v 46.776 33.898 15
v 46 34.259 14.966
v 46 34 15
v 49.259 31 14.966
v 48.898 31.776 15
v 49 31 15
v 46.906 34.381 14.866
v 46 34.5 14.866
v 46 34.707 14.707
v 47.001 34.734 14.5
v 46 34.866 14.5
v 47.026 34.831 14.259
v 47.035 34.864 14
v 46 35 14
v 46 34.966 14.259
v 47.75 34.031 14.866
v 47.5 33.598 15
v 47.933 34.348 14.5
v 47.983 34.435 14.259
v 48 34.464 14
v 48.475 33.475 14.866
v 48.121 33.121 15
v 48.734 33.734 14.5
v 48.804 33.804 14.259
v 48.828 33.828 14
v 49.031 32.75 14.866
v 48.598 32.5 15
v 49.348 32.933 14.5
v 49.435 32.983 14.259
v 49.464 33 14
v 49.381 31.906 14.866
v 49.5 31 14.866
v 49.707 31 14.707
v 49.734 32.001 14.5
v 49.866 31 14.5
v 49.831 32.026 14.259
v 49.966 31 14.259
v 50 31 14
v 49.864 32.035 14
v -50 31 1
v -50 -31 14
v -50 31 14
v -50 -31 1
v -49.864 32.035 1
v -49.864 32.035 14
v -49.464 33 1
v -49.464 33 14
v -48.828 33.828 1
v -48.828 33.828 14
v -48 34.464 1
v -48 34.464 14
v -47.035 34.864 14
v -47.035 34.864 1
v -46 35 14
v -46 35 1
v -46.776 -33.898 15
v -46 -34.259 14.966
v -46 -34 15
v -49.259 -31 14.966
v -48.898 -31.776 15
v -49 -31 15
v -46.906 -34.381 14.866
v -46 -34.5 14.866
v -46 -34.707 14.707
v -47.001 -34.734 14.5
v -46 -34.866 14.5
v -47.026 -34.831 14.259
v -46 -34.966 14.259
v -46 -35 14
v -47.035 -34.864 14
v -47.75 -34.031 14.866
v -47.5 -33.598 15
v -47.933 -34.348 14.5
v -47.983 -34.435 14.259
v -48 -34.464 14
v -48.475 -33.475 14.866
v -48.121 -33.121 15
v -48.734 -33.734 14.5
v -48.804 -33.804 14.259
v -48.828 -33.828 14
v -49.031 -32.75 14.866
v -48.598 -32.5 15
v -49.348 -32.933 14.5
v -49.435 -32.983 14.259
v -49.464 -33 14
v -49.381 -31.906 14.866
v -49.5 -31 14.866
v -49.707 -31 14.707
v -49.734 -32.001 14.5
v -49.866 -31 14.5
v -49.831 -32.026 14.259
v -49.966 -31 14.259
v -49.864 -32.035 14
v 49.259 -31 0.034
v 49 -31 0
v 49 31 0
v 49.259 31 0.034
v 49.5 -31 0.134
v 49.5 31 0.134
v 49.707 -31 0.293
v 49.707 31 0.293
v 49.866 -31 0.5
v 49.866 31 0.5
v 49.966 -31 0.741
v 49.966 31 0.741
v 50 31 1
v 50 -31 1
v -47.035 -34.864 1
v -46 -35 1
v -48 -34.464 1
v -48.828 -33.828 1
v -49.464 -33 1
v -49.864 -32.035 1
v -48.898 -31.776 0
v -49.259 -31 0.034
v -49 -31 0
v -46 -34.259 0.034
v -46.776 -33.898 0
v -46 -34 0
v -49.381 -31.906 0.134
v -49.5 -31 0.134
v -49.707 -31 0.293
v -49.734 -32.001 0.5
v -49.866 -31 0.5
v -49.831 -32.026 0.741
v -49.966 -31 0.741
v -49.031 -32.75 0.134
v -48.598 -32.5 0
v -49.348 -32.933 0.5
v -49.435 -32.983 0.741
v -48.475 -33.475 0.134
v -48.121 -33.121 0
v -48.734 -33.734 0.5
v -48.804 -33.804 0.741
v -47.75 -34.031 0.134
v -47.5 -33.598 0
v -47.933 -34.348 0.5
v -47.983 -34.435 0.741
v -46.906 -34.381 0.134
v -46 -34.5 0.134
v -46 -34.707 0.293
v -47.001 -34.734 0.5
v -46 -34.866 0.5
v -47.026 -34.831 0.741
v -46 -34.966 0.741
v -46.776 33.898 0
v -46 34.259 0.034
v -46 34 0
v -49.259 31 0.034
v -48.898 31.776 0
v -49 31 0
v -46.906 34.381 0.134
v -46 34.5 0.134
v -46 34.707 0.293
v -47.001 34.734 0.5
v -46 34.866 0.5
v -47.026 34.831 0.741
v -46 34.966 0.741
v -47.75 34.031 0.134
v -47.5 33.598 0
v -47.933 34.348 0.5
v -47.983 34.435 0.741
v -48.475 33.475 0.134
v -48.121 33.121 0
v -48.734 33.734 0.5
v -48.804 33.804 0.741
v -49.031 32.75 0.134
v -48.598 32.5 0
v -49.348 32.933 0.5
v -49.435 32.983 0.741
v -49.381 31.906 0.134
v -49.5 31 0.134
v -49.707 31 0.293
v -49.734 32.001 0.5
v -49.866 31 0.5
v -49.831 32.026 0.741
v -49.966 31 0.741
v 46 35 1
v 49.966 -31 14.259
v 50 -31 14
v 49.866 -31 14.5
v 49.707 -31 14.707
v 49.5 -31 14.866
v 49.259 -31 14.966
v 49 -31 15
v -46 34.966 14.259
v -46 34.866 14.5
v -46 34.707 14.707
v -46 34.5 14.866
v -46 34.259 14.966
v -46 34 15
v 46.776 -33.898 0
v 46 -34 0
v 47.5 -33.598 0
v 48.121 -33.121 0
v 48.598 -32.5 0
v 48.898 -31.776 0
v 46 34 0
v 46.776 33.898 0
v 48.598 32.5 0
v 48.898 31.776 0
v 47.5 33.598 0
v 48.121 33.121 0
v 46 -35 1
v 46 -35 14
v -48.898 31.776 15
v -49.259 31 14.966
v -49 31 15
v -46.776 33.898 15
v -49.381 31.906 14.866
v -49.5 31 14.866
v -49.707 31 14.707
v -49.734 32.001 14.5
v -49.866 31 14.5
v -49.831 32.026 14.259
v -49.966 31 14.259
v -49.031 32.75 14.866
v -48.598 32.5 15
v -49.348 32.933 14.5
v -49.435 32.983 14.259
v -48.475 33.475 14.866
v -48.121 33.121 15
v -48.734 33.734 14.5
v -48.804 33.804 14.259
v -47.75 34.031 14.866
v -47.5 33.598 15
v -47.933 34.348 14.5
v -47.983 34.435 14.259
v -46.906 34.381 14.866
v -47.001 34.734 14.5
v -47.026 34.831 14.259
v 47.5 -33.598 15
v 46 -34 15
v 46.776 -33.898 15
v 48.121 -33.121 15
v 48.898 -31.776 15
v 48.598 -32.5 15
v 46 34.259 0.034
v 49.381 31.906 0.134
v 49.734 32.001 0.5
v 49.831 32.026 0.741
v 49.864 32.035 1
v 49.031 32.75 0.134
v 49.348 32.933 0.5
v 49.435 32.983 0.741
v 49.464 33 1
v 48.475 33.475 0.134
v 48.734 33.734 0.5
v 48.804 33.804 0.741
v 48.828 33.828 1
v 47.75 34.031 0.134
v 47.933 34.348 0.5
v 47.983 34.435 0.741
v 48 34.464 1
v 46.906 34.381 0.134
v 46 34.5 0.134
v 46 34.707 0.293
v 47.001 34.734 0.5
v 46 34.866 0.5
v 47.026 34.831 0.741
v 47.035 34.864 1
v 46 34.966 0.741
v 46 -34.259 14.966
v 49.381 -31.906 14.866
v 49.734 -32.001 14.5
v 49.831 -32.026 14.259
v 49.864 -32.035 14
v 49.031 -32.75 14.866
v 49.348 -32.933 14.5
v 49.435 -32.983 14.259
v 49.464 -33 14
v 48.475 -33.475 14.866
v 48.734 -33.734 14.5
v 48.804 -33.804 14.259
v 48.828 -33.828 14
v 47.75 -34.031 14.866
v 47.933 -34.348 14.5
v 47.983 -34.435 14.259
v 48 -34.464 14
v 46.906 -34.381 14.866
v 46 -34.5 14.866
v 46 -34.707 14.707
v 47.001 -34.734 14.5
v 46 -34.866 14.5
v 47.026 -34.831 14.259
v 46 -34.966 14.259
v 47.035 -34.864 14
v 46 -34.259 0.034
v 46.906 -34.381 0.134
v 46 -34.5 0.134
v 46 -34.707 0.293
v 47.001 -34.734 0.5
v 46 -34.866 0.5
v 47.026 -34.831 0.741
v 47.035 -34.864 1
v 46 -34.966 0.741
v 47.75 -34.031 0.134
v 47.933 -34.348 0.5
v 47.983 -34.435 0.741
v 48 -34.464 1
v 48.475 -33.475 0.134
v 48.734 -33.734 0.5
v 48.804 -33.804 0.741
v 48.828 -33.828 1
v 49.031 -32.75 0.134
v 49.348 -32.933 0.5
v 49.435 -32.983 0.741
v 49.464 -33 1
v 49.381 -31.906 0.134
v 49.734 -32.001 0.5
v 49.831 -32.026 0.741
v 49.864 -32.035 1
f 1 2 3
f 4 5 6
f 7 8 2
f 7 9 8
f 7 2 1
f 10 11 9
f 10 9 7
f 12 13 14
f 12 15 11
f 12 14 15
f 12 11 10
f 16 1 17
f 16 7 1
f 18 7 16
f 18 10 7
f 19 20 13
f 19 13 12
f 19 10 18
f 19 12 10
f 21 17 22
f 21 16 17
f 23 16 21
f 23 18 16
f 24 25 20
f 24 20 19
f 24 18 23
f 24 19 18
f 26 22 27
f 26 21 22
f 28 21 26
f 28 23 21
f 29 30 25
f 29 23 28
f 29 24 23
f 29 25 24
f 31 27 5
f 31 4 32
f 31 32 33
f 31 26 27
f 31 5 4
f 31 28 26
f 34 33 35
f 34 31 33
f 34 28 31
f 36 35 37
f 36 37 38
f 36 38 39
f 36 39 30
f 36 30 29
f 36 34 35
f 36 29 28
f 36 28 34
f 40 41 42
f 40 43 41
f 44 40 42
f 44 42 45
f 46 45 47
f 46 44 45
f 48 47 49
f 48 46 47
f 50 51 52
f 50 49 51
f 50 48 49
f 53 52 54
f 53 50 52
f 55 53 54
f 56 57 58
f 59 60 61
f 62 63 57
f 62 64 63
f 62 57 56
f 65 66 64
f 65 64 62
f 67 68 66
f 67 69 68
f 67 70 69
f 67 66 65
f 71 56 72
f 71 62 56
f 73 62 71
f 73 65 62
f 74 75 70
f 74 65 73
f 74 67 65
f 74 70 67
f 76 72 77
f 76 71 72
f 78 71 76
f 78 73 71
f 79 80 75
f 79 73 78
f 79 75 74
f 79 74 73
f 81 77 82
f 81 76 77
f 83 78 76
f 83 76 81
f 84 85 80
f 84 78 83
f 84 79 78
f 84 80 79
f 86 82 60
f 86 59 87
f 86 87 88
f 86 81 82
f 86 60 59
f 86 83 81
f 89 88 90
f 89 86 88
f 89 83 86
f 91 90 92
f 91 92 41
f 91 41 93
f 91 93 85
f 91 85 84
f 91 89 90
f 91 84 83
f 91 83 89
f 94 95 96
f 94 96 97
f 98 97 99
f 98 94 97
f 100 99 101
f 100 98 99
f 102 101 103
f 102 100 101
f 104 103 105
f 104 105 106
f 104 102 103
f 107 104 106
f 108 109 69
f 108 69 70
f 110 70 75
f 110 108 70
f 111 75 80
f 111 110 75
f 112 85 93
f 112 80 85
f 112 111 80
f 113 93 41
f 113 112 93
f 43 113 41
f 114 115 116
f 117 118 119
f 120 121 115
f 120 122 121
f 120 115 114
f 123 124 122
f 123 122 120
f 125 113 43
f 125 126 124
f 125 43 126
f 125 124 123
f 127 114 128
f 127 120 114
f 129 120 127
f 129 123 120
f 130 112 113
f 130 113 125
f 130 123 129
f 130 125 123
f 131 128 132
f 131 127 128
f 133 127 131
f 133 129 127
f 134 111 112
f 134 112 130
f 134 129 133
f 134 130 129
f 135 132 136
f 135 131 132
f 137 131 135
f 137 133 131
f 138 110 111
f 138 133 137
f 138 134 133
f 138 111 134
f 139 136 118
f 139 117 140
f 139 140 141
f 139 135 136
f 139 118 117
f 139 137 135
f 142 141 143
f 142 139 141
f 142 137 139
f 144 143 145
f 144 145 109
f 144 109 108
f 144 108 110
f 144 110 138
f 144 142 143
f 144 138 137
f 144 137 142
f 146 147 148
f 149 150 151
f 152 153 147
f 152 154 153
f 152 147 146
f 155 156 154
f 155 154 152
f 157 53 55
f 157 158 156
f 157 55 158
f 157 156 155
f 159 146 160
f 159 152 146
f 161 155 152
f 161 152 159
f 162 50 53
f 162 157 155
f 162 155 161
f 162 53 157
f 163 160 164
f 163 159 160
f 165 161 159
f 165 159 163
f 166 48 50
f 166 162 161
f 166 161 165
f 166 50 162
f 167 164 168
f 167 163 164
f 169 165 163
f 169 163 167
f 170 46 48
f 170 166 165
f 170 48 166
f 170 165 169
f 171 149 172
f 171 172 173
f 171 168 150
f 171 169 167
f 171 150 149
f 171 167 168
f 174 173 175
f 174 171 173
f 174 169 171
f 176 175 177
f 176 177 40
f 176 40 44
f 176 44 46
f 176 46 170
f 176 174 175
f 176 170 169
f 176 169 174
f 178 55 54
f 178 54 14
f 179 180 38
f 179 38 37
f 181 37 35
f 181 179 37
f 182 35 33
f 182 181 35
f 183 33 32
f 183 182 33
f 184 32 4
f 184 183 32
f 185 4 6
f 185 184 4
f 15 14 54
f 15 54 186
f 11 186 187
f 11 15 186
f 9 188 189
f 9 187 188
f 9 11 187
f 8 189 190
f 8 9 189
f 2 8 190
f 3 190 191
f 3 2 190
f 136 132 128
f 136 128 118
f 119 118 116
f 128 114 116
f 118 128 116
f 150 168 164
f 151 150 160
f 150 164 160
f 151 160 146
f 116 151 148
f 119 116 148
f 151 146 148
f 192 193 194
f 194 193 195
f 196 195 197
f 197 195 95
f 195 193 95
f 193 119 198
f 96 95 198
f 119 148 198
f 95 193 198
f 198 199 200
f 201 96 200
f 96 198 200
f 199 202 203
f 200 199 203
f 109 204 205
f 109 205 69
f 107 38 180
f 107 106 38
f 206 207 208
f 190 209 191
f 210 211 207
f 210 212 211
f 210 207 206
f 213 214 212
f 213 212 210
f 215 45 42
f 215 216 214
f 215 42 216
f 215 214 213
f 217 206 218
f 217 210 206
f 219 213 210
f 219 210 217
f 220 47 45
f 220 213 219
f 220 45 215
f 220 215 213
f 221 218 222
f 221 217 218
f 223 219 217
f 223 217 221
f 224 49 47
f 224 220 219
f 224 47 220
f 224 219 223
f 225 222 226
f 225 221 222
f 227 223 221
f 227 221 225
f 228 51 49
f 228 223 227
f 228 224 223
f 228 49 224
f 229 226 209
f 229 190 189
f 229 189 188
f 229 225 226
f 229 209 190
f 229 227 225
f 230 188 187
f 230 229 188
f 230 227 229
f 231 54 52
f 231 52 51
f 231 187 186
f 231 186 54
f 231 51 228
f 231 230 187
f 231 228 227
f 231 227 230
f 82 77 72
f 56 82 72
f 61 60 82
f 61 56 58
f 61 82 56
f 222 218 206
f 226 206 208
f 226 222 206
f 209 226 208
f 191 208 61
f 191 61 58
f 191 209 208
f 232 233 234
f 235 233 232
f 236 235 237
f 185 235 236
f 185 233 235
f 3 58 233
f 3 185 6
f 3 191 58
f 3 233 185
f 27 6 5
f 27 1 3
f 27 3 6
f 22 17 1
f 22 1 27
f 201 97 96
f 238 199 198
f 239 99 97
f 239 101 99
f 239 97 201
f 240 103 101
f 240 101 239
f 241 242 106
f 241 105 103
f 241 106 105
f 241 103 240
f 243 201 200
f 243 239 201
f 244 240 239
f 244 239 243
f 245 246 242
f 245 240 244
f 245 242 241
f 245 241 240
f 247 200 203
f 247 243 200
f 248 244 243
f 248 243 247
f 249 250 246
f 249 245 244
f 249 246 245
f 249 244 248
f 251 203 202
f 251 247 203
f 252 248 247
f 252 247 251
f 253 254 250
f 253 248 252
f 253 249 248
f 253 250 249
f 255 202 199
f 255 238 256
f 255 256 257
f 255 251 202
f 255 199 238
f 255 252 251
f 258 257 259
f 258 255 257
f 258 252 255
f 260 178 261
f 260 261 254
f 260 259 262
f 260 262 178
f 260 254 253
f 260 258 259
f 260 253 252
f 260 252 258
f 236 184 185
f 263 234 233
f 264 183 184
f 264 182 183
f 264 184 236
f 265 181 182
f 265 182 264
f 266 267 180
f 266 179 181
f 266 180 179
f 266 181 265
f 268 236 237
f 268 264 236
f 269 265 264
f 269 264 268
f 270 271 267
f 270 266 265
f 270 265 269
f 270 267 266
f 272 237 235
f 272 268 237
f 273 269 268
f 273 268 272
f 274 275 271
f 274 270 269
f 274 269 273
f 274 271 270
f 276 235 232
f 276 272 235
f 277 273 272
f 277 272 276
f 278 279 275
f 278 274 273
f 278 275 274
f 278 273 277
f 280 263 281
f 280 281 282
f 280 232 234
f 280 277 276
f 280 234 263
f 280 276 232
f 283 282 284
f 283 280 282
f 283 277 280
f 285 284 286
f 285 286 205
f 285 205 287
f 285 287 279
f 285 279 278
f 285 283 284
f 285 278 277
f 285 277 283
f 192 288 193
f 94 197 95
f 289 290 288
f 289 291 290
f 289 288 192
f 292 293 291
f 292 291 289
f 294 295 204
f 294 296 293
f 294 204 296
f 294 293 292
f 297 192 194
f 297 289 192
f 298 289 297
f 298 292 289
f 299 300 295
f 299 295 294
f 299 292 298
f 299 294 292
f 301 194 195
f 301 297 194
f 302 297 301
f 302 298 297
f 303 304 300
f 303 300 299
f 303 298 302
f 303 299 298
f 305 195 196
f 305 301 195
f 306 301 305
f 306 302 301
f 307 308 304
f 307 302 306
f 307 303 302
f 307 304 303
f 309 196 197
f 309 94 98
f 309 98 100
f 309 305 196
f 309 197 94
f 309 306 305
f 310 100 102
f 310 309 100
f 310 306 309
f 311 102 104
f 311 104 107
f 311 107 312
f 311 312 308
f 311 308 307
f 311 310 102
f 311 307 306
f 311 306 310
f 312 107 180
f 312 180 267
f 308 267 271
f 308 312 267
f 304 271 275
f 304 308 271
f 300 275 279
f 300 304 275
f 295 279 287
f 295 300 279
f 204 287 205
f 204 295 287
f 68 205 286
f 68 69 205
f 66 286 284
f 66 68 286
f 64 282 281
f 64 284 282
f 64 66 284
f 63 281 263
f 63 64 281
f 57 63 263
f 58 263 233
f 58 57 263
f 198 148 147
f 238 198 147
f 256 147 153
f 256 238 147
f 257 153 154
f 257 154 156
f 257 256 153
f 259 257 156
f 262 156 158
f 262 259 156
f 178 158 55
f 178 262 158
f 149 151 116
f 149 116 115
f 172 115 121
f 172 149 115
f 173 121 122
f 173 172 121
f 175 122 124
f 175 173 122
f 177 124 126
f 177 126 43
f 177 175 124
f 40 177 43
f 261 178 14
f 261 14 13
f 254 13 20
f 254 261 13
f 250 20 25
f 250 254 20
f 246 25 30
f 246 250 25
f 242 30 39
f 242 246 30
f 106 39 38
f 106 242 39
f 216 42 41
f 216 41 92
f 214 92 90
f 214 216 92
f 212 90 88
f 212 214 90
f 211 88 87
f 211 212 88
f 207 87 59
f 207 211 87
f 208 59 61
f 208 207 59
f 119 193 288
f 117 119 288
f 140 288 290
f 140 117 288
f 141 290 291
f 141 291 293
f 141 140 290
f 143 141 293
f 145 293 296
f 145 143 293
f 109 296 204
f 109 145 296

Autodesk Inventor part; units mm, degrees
ref_plane "YZ Plane" through (0, 0, 0) normal (1, 0, 0) x (0, 1, 0)
ref_plane "XZ Plane" through (0, 0, 0) normal (0, 1, 0) x (-1, 0, 0)
ref_plane "XY Plane" through (0, 0, 0) normal (0, 0, 1) x (1, 0, 0)
sketch "Sketch1" plane through (0, 0, 0) normal (0, 0, 1) x (1, 0, 0)
  line L0 (-50, 35) -> (50, 35)
  line L1 (50, 35) -> (50, -35)
  line L2 (50, -35) -> (-50, -35)
  line L3 (-50, -35) -> (-50, 35)
  point P0 (0, 0)
  dimension "d0" = 100
  dimension "d1" = 70
  dimension "d2" = 35
  dimension "d3" = 50
extrude "Extrusion1" add sketch "Sketch1" along normal blind 15
fillet "Fillet1" radius 1 8 edges at (50, 0, 15) (0, 35, 15) (0, 35, 0) (50, 0, 0) (-50, 0, 15) (0, -35, 15) (-50, 0, 0) (0, -35, 0)
fillet "Fillet2" radius 4 12 edges at (-49.7071, -34.7071, 14.7071) (-49.7071, -34.7071, 0.2929) (-50, -35, 7.5) (-50, 35, 7.5) (-49.7071, 34.7071, 14.7071) (-49.7071, 34.7071, 0.2929) (50, -35, 7.5) (49.7071, -34.7071, 14.7071) (49.7071, -34.7071, 0.2929) (50, 35, 7.5) (49.7071, 34.7071, 14.7071) (49.7071, 34.7071, 0.2929)
properties part number "SSD2.5"
